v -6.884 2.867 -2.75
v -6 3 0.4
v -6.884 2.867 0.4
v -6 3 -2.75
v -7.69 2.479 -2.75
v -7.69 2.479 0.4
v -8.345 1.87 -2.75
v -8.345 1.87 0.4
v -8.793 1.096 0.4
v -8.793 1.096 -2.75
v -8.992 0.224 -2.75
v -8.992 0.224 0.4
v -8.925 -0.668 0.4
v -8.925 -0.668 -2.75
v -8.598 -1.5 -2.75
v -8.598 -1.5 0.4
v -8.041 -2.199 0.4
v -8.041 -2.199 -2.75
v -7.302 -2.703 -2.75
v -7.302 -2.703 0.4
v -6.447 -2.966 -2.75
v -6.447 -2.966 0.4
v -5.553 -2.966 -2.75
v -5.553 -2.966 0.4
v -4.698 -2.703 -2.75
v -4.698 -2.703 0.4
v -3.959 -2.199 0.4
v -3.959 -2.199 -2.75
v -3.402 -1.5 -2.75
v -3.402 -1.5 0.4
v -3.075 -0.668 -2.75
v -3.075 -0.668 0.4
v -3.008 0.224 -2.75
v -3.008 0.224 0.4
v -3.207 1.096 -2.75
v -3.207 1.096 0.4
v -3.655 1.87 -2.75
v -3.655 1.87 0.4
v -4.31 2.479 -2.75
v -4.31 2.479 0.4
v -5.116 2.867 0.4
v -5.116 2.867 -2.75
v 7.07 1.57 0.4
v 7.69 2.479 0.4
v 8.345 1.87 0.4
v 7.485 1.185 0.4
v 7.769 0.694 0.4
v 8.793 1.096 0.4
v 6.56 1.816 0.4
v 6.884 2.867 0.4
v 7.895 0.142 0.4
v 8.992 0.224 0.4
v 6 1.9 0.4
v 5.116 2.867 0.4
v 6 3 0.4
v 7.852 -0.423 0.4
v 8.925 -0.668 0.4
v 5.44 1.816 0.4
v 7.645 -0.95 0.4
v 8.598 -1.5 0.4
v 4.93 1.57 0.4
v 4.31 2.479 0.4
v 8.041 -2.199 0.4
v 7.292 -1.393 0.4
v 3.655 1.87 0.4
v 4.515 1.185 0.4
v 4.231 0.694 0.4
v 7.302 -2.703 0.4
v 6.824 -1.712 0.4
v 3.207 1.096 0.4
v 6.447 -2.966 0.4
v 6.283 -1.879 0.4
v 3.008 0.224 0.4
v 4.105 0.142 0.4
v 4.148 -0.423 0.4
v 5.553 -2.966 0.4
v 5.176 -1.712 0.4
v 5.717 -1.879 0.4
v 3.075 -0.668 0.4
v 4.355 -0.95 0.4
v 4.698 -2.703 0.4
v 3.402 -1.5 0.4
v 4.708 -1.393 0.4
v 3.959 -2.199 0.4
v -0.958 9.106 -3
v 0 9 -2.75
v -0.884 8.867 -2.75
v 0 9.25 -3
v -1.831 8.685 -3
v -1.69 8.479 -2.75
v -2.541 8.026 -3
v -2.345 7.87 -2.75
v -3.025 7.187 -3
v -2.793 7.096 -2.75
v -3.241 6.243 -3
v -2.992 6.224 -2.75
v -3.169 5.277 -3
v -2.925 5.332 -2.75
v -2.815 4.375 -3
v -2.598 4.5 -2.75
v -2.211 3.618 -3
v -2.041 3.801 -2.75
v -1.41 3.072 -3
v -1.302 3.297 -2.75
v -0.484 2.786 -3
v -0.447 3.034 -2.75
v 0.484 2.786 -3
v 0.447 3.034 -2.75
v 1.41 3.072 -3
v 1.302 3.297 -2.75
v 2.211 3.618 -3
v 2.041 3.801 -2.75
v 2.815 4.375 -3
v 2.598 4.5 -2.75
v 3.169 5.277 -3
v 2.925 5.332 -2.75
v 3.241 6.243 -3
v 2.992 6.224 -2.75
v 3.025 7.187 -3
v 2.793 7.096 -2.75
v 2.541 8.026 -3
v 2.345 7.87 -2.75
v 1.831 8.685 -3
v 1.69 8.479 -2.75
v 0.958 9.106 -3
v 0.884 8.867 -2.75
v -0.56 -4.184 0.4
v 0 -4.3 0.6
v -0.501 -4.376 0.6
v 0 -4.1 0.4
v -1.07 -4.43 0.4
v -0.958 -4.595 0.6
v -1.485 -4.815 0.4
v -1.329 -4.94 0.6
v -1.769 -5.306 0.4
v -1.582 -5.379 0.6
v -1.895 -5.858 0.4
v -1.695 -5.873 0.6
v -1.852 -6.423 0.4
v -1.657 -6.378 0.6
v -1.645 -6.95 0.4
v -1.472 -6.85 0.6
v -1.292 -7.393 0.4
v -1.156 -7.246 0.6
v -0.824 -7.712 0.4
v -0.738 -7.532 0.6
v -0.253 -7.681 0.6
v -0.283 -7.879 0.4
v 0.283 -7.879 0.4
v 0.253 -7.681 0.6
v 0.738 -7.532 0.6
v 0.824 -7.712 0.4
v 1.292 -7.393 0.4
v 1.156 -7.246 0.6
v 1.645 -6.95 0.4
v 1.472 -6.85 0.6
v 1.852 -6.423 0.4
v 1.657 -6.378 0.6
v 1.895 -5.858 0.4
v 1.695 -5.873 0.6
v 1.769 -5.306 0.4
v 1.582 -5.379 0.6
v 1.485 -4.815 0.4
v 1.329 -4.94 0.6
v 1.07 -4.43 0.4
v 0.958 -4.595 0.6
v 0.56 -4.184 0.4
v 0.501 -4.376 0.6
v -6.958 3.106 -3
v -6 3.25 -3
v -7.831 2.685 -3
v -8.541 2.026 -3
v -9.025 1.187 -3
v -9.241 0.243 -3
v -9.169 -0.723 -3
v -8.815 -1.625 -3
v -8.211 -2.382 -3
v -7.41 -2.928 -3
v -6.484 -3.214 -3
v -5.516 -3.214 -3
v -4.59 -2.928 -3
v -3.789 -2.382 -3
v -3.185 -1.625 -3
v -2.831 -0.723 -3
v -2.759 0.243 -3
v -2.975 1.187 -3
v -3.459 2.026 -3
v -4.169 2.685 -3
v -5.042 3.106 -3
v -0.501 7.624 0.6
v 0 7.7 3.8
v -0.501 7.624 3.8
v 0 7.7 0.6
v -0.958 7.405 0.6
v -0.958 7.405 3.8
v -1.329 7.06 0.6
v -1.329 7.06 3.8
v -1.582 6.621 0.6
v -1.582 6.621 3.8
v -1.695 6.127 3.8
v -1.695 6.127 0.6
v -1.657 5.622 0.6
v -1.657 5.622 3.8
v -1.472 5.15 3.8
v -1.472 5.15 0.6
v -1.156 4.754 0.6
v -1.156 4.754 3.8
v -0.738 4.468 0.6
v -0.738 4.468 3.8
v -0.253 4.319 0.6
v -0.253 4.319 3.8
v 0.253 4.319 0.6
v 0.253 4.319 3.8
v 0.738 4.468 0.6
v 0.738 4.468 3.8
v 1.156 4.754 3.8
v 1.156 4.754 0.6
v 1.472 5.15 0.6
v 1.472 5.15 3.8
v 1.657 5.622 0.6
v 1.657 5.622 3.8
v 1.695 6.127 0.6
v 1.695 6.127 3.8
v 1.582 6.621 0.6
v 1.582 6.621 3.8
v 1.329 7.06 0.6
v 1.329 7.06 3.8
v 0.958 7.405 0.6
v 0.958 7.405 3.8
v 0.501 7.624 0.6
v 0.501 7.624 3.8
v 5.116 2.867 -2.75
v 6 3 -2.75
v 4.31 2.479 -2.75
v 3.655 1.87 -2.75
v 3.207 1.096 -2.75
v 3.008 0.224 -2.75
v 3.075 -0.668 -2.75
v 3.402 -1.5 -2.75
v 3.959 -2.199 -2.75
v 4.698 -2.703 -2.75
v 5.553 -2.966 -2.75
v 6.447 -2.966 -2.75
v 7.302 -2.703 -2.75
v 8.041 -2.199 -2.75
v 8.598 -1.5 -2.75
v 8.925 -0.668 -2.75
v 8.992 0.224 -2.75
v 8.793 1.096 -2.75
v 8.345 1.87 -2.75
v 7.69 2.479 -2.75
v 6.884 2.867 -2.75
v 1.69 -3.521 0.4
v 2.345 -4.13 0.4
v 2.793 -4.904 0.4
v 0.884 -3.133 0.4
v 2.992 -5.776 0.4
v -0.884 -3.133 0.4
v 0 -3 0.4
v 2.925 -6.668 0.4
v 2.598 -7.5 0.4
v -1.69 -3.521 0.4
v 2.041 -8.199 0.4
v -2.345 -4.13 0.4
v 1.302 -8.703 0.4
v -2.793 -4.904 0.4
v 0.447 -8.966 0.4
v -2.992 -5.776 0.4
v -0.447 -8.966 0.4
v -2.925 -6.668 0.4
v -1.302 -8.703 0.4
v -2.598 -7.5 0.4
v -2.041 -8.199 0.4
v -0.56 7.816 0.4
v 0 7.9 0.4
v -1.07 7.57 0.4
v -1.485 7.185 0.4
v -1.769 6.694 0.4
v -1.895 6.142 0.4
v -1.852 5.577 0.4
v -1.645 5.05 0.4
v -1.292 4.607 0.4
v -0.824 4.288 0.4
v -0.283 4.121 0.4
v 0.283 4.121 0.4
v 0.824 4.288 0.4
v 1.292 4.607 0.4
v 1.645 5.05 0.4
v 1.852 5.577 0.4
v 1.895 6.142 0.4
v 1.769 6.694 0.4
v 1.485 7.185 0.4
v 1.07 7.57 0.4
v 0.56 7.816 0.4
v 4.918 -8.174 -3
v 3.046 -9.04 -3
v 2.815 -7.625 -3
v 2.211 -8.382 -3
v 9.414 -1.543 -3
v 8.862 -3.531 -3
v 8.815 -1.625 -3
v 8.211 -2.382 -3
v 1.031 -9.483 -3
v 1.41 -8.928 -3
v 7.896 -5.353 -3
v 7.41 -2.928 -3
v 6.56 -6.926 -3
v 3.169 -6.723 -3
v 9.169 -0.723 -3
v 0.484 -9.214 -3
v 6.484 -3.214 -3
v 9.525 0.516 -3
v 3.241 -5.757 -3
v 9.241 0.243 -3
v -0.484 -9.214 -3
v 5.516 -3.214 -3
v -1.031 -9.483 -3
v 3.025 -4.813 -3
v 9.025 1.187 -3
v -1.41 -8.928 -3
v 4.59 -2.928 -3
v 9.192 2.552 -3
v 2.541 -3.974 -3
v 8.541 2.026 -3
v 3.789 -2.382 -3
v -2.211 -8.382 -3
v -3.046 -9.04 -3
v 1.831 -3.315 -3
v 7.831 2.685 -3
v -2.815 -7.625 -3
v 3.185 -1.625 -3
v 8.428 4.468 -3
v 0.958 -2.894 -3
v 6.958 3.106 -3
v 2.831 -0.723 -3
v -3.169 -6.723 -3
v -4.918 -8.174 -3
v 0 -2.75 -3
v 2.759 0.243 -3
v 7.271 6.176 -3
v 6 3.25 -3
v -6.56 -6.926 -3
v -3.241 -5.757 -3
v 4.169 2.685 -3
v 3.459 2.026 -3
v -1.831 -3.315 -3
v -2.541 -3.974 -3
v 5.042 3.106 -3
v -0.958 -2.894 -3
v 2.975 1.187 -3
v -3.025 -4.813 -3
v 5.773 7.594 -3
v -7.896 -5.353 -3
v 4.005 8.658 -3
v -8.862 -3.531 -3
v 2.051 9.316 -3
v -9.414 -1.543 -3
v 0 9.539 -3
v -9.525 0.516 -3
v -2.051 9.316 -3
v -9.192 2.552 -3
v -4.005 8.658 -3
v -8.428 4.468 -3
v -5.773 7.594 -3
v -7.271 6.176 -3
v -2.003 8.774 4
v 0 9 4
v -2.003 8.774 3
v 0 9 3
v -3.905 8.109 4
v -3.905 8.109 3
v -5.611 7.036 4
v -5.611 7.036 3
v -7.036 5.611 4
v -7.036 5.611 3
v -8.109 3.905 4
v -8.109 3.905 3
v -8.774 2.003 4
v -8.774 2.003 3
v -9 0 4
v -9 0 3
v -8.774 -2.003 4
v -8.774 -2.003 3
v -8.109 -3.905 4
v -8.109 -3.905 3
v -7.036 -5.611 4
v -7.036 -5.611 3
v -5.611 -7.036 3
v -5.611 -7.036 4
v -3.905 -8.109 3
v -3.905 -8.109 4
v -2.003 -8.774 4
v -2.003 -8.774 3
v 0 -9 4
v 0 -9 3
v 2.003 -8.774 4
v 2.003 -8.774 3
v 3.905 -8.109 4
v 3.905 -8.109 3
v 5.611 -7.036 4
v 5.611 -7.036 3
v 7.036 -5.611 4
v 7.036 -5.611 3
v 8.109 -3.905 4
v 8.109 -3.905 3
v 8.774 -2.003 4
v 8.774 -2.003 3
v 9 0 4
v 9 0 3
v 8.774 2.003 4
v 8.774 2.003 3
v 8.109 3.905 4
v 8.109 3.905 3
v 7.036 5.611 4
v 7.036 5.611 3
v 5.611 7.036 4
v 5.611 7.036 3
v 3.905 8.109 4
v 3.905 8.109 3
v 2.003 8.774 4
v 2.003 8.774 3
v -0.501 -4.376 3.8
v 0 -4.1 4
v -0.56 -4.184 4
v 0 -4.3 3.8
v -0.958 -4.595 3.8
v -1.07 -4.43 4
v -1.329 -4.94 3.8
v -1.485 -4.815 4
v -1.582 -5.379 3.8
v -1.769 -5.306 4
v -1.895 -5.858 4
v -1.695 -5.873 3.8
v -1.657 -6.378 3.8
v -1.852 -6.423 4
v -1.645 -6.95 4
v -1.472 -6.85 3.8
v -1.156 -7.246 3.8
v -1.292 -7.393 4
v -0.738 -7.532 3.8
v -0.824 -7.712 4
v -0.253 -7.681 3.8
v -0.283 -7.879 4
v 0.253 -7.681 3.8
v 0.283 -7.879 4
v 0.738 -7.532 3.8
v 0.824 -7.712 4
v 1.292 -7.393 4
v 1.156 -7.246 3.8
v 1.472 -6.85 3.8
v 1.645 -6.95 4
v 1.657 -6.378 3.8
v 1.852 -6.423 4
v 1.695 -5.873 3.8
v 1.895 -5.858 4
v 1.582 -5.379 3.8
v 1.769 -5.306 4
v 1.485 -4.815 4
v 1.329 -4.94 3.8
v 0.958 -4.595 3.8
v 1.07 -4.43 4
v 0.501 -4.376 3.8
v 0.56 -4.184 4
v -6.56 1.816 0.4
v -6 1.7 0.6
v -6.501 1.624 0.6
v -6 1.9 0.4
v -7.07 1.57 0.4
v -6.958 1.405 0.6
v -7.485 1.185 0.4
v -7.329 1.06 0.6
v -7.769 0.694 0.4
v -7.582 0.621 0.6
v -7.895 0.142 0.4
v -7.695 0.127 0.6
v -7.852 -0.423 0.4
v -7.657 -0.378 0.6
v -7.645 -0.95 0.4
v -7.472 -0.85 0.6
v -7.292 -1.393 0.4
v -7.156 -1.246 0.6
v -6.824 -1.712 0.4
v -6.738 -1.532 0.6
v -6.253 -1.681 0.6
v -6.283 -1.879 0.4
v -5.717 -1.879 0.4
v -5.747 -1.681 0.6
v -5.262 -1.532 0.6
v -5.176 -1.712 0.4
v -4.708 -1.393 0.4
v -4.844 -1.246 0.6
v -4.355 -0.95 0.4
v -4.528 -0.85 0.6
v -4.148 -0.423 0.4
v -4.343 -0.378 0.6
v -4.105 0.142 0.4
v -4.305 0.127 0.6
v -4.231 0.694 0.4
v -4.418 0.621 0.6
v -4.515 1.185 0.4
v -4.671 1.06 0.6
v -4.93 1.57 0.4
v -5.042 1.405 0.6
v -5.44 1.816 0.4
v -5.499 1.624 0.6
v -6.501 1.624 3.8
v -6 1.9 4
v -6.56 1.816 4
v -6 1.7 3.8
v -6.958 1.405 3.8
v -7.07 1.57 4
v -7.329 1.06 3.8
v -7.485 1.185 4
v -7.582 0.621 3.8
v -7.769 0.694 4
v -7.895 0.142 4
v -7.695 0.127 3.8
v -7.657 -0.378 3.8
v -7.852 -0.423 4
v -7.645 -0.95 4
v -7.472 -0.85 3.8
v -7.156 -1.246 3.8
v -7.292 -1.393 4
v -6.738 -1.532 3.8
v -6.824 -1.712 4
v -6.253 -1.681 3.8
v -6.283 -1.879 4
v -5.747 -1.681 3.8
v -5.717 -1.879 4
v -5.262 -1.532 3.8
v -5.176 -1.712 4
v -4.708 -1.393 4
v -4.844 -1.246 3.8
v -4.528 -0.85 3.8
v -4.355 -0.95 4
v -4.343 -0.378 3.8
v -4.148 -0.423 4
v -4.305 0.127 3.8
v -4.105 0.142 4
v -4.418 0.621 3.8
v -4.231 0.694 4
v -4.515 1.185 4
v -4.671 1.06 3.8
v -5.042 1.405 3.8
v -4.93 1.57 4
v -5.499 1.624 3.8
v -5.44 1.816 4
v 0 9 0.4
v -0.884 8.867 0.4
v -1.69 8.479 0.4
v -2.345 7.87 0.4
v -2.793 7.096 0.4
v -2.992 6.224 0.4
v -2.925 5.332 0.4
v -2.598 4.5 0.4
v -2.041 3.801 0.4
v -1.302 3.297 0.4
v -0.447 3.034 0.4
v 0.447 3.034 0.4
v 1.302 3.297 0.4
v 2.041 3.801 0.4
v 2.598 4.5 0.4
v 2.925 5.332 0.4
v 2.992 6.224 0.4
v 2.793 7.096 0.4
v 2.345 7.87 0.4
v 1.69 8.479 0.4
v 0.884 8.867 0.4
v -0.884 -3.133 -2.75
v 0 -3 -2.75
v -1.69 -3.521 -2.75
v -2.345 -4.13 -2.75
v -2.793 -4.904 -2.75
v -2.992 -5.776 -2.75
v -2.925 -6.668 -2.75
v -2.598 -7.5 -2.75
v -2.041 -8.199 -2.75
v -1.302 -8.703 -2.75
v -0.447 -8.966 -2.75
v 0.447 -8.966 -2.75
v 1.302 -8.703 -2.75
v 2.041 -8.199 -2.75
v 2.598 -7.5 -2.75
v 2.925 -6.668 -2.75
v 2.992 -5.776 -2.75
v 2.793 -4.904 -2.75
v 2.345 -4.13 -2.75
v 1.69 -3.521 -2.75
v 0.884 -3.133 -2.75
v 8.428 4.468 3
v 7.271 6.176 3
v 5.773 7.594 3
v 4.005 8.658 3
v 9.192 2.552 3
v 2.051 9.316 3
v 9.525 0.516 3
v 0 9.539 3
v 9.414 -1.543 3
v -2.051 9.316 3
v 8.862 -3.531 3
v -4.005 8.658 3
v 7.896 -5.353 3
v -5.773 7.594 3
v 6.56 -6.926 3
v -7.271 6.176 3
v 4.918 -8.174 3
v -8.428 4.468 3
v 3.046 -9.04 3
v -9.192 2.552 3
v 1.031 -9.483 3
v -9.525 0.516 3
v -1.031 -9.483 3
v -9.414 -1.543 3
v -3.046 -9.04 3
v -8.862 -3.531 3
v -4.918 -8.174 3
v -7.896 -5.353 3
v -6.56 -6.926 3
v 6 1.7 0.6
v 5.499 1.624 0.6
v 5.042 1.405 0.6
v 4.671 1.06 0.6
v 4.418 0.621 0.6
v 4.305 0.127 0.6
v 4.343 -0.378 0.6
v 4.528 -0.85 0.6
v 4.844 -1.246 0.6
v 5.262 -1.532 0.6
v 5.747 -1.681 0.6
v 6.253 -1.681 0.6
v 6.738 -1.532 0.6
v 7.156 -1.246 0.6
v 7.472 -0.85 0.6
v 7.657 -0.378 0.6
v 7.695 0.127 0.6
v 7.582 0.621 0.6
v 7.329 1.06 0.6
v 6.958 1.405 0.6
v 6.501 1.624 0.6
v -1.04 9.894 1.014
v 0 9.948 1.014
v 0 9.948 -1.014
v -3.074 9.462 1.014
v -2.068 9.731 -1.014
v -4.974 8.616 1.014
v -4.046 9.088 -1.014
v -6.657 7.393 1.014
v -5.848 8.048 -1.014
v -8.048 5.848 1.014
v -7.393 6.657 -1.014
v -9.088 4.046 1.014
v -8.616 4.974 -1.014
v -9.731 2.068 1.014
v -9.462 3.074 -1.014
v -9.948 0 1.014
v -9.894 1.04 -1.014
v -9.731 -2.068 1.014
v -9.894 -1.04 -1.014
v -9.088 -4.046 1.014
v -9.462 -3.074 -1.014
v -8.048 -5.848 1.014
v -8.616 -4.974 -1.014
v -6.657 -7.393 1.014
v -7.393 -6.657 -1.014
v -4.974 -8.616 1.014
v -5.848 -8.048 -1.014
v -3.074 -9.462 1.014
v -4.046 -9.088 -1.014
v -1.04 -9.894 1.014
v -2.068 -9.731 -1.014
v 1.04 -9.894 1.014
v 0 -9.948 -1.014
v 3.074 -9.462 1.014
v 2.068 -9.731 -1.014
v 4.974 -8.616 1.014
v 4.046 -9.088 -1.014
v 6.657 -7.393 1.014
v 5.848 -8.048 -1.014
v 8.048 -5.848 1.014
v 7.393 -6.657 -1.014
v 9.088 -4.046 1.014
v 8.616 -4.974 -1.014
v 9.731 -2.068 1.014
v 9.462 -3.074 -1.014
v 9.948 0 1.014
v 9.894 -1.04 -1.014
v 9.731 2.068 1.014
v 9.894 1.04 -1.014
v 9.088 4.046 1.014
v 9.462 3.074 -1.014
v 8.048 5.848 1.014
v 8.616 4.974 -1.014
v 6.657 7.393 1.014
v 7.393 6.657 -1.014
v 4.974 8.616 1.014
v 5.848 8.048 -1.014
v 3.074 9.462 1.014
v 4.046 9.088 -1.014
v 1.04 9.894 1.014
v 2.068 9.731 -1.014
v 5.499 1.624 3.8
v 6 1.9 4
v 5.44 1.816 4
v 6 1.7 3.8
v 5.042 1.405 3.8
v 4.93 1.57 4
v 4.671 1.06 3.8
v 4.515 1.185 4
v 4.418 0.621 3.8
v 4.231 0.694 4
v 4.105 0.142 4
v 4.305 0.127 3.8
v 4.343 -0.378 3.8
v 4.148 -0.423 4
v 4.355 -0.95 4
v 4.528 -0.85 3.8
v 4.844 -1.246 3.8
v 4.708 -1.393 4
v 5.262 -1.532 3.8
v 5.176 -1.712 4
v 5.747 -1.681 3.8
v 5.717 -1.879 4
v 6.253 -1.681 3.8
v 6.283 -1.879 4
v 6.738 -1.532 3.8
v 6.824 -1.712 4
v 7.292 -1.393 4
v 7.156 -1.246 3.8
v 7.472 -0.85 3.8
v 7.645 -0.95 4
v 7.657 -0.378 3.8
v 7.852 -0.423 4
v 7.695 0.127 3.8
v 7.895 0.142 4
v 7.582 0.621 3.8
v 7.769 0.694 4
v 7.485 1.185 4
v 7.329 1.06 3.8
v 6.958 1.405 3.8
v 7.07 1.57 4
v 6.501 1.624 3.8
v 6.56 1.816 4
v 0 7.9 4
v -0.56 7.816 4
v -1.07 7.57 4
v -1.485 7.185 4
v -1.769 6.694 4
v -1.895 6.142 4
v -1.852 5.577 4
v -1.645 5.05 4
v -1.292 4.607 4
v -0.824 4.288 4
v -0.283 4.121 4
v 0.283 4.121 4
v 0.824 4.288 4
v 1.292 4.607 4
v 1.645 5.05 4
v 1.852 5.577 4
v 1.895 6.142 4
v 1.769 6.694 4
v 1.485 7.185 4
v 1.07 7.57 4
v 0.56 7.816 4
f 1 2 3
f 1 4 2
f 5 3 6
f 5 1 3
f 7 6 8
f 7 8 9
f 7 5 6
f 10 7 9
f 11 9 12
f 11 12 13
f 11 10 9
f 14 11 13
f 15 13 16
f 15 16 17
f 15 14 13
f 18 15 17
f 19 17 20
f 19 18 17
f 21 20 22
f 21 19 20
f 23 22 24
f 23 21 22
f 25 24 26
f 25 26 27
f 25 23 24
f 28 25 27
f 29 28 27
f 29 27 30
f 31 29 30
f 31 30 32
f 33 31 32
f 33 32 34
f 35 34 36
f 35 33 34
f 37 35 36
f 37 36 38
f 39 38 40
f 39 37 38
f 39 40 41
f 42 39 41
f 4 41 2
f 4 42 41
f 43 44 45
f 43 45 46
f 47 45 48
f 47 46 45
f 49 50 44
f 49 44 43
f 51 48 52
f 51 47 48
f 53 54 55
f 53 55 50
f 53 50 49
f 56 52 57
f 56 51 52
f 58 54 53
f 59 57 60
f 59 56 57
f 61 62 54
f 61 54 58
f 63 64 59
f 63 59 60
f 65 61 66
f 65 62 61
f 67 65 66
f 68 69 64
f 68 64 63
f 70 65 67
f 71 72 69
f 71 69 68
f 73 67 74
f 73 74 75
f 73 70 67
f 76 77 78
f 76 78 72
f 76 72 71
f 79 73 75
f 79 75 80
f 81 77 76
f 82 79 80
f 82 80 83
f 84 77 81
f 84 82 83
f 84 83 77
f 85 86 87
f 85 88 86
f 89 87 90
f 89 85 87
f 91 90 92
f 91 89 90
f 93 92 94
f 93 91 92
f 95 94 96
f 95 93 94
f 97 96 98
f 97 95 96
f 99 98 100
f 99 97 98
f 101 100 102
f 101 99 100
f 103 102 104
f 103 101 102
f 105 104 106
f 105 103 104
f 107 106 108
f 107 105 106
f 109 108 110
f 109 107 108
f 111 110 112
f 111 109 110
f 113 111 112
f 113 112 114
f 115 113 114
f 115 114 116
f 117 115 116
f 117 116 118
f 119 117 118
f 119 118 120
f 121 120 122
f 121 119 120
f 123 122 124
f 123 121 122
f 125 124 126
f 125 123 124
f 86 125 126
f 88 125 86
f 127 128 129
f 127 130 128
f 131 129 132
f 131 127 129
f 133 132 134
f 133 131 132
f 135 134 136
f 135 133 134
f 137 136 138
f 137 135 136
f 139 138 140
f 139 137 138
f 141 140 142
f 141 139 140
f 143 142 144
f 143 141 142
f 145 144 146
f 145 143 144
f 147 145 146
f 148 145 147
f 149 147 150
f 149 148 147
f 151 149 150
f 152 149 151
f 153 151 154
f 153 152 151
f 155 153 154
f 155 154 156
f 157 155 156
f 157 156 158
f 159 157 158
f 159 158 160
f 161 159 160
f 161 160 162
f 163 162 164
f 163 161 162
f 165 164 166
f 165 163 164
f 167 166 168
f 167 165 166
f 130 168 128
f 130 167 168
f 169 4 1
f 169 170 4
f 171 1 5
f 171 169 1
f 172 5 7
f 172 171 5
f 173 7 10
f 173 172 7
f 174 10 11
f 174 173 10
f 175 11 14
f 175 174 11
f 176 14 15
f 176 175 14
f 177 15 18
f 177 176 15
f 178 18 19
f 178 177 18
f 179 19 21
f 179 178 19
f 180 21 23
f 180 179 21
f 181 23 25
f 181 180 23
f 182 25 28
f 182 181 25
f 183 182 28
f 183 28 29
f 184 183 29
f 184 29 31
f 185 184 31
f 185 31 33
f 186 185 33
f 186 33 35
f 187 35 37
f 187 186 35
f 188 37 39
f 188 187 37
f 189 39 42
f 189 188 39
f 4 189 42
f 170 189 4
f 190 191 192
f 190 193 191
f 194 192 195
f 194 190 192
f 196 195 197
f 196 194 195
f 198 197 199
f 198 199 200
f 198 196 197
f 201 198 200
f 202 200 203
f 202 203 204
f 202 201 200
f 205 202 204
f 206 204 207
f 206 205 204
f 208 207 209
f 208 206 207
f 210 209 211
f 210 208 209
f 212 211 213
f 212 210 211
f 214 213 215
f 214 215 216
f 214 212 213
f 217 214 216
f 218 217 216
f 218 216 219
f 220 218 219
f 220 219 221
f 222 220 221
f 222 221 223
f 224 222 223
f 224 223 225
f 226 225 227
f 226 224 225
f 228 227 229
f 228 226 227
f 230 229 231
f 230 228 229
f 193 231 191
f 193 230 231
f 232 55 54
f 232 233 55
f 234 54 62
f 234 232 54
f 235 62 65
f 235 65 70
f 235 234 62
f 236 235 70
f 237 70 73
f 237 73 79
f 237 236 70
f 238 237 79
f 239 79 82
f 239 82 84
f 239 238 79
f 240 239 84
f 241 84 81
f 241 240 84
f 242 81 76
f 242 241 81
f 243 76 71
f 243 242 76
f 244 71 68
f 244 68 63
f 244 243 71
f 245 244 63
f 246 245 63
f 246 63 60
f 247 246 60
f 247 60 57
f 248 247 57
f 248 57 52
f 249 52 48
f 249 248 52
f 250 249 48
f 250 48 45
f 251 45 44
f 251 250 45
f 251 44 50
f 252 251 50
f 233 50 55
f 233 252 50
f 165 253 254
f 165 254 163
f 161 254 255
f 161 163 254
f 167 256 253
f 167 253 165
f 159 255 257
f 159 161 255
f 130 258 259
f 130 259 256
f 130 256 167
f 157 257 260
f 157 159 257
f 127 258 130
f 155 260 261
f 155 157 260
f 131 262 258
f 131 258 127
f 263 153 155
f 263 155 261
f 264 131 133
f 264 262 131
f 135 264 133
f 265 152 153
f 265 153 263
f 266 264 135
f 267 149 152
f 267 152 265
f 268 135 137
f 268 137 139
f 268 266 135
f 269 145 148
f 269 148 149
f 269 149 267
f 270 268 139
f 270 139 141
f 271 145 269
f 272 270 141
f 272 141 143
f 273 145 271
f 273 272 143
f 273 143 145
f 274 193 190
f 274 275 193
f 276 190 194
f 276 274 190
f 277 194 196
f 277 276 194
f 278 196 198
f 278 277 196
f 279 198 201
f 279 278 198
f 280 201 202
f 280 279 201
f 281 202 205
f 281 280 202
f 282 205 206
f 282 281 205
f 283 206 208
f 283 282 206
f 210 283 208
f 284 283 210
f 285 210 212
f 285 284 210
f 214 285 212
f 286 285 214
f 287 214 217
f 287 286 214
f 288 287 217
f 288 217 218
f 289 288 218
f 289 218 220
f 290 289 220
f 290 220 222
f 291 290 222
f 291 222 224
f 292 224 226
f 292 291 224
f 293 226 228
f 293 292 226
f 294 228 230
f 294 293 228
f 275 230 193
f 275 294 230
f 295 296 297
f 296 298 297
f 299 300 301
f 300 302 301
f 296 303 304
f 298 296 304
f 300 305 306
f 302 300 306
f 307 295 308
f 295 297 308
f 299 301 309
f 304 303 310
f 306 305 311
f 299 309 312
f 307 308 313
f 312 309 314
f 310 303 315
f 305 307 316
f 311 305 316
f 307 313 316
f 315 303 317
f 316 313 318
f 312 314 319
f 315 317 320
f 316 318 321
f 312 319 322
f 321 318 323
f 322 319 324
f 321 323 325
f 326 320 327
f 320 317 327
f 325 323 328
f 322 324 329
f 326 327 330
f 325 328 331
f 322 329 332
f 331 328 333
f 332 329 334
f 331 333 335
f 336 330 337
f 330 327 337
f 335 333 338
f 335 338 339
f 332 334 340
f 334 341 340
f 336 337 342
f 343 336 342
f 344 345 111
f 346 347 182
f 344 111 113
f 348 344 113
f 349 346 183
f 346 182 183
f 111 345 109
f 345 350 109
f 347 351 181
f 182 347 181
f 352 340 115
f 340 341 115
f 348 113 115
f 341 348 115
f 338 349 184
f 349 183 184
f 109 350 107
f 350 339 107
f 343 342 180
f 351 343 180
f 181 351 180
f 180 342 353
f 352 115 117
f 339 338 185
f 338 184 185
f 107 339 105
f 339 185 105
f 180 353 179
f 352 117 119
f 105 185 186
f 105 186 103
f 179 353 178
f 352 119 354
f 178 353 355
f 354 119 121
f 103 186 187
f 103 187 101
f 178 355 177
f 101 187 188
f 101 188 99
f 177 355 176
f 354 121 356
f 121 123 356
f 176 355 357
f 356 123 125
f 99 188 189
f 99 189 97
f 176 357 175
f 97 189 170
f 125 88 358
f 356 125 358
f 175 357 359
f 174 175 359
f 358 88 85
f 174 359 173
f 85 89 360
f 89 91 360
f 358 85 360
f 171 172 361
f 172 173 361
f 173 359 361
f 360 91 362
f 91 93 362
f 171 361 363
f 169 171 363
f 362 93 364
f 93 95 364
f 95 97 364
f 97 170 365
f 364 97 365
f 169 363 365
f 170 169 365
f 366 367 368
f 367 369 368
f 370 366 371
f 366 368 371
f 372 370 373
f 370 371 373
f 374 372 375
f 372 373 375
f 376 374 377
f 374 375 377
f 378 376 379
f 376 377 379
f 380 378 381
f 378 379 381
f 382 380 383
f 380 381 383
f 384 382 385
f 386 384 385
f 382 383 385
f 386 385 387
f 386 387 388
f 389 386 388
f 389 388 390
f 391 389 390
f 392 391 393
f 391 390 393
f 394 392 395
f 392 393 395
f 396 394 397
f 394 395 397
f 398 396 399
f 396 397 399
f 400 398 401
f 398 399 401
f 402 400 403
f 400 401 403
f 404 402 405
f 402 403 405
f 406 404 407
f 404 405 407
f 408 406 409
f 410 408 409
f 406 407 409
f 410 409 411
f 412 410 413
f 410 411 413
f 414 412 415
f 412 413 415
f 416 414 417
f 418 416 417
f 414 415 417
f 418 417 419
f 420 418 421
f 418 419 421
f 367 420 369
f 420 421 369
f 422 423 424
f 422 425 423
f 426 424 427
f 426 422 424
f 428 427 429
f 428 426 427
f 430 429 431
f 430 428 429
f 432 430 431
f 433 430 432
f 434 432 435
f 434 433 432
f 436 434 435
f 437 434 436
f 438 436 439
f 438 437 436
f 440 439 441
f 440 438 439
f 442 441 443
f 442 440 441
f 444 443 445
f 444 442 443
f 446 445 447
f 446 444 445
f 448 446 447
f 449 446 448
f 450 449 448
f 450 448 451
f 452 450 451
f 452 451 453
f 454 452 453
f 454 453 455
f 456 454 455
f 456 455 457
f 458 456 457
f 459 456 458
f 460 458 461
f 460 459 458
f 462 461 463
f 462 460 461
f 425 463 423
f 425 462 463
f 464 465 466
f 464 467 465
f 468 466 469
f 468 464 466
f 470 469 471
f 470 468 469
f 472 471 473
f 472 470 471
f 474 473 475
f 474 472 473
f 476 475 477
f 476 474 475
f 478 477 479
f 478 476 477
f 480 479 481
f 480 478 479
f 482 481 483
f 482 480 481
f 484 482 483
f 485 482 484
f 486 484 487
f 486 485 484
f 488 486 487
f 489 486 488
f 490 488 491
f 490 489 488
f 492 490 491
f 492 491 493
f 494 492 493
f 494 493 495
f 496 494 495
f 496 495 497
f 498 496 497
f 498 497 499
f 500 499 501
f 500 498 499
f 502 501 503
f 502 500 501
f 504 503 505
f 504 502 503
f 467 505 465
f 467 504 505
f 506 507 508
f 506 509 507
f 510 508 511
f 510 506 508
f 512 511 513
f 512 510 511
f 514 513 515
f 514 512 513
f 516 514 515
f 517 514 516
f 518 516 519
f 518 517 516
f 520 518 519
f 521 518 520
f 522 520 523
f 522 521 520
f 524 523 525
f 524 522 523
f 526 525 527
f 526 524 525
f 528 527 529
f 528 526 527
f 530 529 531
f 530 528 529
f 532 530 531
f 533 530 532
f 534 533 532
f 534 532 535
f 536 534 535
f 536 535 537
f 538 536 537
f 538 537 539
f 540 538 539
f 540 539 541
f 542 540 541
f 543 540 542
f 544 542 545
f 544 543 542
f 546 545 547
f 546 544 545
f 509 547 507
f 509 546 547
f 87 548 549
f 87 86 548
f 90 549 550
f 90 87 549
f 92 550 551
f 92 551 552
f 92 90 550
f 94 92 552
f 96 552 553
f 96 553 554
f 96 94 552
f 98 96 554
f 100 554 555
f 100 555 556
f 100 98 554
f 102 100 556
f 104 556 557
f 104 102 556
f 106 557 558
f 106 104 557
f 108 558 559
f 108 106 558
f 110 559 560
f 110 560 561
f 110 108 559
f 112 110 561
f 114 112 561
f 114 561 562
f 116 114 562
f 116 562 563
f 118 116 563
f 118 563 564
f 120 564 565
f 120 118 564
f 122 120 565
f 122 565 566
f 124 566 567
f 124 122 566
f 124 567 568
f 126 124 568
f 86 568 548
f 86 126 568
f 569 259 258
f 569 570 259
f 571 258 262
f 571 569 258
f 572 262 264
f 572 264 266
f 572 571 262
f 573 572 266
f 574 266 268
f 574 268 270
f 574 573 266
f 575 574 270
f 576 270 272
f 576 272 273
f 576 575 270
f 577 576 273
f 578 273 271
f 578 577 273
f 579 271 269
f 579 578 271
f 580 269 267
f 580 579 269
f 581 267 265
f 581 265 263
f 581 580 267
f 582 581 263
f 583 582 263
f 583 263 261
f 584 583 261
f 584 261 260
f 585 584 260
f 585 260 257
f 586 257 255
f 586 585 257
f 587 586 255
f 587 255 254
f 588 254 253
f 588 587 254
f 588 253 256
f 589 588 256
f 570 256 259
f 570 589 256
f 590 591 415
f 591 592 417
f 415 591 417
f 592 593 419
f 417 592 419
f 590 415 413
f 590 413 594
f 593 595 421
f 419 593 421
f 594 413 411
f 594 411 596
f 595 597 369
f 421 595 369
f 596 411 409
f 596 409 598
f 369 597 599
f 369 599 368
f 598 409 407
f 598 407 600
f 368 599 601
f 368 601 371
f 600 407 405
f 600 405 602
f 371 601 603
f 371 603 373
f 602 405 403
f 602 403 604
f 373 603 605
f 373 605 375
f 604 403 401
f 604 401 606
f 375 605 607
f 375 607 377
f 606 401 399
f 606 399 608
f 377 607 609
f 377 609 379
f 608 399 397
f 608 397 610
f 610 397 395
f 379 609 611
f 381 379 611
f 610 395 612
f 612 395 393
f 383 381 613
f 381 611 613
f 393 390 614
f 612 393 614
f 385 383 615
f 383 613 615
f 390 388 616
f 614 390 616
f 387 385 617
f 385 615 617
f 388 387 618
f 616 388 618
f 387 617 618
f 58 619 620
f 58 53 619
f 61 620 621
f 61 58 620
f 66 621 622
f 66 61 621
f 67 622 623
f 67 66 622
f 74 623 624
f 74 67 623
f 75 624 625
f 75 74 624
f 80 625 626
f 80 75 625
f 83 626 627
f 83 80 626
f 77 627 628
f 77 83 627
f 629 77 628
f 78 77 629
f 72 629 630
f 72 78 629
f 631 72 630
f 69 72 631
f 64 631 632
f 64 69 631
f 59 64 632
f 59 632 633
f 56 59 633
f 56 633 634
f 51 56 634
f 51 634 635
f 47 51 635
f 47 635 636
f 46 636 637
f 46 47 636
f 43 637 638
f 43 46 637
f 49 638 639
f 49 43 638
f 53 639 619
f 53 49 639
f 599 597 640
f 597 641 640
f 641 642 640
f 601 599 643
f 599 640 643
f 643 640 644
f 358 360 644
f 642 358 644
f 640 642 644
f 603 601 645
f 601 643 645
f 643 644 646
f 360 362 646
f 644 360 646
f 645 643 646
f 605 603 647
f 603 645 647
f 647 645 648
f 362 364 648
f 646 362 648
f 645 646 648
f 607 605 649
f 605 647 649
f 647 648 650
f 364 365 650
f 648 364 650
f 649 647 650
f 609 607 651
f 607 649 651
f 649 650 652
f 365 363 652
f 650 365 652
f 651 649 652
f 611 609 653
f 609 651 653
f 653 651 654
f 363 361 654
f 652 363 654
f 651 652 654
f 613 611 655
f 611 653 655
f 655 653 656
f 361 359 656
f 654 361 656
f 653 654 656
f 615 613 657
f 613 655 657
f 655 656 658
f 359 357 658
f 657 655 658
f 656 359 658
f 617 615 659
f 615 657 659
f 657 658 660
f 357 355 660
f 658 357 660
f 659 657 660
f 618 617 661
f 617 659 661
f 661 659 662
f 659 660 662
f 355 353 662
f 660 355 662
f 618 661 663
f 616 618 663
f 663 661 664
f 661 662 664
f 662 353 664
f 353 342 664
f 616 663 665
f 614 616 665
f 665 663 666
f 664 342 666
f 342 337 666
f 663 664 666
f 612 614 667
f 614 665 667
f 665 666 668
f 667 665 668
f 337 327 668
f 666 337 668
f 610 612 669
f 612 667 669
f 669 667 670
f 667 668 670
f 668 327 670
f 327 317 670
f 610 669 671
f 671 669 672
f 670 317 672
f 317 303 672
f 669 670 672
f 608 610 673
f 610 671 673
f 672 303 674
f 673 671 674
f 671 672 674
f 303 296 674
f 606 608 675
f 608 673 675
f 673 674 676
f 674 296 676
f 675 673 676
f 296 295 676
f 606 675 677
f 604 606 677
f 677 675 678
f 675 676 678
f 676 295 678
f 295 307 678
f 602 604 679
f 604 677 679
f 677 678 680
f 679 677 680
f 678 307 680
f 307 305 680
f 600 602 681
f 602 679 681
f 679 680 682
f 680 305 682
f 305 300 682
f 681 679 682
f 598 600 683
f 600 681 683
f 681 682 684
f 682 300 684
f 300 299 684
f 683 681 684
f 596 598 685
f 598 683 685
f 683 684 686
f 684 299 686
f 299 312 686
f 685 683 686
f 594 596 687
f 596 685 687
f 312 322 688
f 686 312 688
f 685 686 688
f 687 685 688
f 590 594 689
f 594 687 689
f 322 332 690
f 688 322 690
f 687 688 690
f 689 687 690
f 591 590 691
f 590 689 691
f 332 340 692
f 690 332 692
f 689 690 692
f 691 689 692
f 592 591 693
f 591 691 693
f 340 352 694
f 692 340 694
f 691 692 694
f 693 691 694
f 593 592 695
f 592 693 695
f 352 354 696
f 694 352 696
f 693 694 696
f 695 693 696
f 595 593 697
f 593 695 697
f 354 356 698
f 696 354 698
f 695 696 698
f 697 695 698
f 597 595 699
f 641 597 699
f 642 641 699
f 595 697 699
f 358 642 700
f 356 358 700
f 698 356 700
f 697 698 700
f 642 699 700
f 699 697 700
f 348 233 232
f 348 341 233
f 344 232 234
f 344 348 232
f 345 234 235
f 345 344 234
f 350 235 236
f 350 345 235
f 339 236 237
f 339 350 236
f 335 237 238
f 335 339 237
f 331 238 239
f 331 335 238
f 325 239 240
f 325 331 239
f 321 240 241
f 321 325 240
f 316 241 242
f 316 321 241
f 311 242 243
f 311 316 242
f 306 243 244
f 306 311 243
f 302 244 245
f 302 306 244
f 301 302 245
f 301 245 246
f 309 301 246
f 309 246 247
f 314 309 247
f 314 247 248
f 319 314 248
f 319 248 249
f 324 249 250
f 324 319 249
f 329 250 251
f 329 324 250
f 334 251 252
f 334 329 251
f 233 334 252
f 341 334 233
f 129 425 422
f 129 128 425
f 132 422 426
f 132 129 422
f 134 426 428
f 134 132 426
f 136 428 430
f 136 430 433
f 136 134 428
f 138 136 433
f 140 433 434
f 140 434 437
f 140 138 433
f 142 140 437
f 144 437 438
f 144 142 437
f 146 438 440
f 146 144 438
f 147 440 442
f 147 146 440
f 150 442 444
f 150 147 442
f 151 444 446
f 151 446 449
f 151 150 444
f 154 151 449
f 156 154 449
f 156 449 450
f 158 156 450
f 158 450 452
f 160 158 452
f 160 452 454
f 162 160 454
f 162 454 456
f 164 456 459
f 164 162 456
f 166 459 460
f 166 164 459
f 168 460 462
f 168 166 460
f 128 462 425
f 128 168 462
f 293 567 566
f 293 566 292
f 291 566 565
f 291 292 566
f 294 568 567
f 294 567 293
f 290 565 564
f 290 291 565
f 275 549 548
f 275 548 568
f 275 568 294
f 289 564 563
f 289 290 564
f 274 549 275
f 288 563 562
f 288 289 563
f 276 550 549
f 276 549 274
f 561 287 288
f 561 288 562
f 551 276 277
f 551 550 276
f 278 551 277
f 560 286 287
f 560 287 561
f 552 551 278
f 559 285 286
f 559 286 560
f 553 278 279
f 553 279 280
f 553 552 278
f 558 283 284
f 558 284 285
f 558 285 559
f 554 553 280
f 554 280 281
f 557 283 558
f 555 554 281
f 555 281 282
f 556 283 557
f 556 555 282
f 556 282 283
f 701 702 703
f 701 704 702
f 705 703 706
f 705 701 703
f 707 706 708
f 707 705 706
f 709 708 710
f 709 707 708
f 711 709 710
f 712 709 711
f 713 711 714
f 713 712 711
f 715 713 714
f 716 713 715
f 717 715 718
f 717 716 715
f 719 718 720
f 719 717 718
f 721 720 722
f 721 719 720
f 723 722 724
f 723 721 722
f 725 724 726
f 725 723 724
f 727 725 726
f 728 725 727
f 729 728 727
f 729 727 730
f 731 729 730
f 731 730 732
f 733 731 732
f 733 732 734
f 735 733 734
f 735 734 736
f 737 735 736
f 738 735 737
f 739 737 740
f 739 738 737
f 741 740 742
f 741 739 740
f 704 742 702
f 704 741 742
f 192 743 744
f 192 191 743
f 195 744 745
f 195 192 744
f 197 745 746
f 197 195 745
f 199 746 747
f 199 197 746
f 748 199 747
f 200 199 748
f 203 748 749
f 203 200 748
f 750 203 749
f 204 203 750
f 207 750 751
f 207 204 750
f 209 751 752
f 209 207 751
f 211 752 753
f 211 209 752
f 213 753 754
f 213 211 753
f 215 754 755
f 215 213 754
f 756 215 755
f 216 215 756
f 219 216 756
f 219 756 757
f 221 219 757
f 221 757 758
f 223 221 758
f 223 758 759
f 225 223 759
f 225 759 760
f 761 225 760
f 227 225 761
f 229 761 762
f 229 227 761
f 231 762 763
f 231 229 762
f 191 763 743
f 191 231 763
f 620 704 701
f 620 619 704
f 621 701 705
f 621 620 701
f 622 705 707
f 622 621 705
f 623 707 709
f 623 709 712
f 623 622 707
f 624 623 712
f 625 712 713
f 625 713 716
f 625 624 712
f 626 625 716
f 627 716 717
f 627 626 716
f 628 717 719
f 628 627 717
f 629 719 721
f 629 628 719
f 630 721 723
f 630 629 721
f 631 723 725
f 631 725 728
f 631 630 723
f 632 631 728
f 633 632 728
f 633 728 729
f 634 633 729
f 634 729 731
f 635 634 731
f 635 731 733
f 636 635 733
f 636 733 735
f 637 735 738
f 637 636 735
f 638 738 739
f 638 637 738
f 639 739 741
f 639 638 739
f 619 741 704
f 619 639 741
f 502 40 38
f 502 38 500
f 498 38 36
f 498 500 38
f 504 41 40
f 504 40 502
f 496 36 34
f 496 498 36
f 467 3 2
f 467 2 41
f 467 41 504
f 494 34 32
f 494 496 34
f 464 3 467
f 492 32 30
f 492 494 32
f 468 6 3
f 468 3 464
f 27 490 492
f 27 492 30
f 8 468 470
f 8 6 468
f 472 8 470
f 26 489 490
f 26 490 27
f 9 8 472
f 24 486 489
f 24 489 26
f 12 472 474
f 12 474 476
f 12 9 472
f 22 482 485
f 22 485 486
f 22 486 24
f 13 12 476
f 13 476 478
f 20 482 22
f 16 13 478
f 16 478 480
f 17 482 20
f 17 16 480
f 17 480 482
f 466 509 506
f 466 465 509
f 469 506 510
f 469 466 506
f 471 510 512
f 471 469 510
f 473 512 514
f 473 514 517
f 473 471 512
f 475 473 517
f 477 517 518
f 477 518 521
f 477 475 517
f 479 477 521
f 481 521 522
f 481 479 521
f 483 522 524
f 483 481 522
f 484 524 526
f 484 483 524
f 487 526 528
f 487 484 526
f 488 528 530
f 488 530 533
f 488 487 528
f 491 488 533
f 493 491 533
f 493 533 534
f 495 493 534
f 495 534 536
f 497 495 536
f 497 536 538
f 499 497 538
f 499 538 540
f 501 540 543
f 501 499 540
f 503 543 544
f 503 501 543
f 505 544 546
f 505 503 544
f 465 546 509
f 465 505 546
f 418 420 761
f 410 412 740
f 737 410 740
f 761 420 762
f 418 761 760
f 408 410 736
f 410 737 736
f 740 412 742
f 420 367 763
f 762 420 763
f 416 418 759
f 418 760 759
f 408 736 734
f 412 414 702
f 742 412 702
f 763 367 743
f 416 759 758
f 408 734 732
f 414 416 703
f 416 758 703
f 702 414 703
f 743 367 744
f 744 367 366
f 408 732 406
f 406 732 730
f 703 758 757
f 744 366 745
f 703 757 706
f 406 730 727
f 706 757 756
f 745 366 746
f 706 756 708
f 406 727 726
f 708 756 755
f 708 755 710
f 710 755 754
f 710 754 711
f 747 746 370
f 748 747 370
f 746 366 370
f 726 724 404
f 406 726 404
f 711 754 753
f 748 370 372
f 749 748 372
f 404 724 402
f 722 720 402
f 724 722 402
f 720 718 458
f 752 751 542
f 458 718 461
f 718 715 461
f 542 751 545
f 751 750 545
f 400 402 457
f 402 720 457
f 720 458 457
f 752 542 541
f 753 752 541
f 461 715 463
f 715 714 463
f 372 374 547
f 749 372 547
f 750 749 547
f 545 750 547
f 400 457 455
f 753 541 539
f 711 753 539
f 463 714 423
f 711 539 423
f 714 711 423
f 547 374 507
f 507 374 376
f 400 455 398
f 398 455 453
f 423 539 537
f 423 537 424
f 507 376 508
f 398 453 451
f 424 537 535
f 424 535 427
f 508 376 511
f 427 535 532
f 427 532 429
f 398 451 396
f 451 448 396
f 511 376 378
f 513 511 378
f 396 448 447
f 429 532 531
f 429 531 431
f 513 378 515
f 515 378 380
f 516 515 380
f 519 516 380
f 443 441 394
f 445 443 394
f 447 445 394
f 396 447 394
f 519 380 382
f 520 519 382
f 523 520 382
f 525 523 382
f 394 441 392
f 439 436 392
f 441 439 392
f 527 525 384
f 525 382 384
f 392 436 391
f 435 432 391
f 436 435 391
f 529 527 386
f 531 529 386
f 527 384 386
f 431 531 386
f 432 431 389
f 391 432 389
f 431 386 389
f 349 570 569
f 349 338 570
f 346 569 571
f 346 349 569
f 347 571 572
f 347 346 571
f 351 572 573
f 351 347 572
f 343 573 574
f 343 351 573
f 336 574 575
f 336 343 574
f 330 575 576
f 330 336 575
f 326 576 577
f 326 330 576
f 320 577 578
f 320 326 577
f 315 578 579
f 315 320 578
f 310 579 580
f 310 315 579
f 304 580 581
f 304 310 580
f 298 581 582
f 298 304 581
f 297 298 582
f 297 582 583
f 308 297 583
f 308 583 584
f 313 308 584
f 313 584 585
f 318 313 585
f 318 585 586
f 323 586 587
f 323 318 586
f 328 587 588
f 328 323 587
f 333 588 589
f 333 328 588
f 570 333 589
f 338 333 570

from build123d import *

# Parameters (mm, degrees)
HOLE_WIZARD_M31_AT_2_COUNT = 2
HOLE_WIZARD_M31_AT_2_PITCH = 12
HOLE_WIZARD_M31_AT_3_COUNT = 2
HOLE_WIZARD_M31_AT_3_PITCH = 8.485281374
HOLE_WIZARD_M31_AT_4_COUNT = 2
HOLE_WIZARD_M31_AT_4_PITCH = 8.485281374


with BuildPart() as part:
    # Эскиз1 → Повернуть1 (revolve)
    with BuildSketch(Plane(origin=(0, 0, 0), x_dir=(0, 0, -1), z_dir=(1, 0, 0))):
        with BuildLine():
            Line((-4, 9), (-3, 9))
            Line((-3, 9), (-3, 9.539392014))
            ThreePointArc((-3, 9.539392014), (0, 10), (3, 9.539392014))
            Line((3, 9.539392014), (3, 0))
            Line((3, 0), (-4, 0))
            Line((-4, 0), (-4, 9))
        make_face()
    revolve(axis=Axis((0, 0, 0), (0, 0, 1)))

    # Эскиз2 → Цековка для винта с внутренним шестигранником M31 (revolve, cut)
    with BuildSketch(Plane(origin=(6, 0, -3), x_dir=(0, 1, 0), z_dir=(1, 0, 0))):
        Polygon((0, 0), (0, 7), (1.9, 7), (1.7, 6.8), (1.7, 3.6), (1.9, 3.4), (3, 3.4), (3, 0.25), (3.25, 0), align=None)
    hole_wizard_m31 = revolve(axis=Axis((6, 0, -9.35), (0, 0, 1)), mode=Mode.SUBTRACT)

    # Цековка для винта с внутренним шестигранником M31 at 2: Цековка для винта с внутренним шестигранником M31 ×2
    with Locations(*[(-i * HOLE_WIZARD_M31_AT_2_PITCH, 0, 0) for i in range(1, HOLE_WIZARD_M31_AT_2_COUNT)]):
        add(hole_wizard_m31, mode=Mode.SUBTRACT)

    # Цековка для винта с внутренним шестигранником M31 at 3: Цековка для винта с внутренним шестигранником M31 ×2
    with Locations(*[Vector(-0.707106781, 0.707106781, 0) * (i * HOLE_WIZARD_M31_AT_3_PITCH) for i in range(1, HOLE_WIZARD_M31_AT_3_COUNT)]):
        add(hole_wizard_m31, mode=Mode.SUBTRACT)

    # Цековка для винта с внутренним шестигранником M31 at 4: Цековка для винта с внутренним шестигранником M31 ×2
    with Locations(*[Vector(-0.707106781, -0.707106781, 0) * (i * HOLE_WIZARD_M31_AT_4_PITCH) for i in range(1, HOLE_WIZARD_M31_AT_4_COUNT)]):
        add(hole_wizard_m31, mode=Mode.SUBTRACT)


solid = part.part
